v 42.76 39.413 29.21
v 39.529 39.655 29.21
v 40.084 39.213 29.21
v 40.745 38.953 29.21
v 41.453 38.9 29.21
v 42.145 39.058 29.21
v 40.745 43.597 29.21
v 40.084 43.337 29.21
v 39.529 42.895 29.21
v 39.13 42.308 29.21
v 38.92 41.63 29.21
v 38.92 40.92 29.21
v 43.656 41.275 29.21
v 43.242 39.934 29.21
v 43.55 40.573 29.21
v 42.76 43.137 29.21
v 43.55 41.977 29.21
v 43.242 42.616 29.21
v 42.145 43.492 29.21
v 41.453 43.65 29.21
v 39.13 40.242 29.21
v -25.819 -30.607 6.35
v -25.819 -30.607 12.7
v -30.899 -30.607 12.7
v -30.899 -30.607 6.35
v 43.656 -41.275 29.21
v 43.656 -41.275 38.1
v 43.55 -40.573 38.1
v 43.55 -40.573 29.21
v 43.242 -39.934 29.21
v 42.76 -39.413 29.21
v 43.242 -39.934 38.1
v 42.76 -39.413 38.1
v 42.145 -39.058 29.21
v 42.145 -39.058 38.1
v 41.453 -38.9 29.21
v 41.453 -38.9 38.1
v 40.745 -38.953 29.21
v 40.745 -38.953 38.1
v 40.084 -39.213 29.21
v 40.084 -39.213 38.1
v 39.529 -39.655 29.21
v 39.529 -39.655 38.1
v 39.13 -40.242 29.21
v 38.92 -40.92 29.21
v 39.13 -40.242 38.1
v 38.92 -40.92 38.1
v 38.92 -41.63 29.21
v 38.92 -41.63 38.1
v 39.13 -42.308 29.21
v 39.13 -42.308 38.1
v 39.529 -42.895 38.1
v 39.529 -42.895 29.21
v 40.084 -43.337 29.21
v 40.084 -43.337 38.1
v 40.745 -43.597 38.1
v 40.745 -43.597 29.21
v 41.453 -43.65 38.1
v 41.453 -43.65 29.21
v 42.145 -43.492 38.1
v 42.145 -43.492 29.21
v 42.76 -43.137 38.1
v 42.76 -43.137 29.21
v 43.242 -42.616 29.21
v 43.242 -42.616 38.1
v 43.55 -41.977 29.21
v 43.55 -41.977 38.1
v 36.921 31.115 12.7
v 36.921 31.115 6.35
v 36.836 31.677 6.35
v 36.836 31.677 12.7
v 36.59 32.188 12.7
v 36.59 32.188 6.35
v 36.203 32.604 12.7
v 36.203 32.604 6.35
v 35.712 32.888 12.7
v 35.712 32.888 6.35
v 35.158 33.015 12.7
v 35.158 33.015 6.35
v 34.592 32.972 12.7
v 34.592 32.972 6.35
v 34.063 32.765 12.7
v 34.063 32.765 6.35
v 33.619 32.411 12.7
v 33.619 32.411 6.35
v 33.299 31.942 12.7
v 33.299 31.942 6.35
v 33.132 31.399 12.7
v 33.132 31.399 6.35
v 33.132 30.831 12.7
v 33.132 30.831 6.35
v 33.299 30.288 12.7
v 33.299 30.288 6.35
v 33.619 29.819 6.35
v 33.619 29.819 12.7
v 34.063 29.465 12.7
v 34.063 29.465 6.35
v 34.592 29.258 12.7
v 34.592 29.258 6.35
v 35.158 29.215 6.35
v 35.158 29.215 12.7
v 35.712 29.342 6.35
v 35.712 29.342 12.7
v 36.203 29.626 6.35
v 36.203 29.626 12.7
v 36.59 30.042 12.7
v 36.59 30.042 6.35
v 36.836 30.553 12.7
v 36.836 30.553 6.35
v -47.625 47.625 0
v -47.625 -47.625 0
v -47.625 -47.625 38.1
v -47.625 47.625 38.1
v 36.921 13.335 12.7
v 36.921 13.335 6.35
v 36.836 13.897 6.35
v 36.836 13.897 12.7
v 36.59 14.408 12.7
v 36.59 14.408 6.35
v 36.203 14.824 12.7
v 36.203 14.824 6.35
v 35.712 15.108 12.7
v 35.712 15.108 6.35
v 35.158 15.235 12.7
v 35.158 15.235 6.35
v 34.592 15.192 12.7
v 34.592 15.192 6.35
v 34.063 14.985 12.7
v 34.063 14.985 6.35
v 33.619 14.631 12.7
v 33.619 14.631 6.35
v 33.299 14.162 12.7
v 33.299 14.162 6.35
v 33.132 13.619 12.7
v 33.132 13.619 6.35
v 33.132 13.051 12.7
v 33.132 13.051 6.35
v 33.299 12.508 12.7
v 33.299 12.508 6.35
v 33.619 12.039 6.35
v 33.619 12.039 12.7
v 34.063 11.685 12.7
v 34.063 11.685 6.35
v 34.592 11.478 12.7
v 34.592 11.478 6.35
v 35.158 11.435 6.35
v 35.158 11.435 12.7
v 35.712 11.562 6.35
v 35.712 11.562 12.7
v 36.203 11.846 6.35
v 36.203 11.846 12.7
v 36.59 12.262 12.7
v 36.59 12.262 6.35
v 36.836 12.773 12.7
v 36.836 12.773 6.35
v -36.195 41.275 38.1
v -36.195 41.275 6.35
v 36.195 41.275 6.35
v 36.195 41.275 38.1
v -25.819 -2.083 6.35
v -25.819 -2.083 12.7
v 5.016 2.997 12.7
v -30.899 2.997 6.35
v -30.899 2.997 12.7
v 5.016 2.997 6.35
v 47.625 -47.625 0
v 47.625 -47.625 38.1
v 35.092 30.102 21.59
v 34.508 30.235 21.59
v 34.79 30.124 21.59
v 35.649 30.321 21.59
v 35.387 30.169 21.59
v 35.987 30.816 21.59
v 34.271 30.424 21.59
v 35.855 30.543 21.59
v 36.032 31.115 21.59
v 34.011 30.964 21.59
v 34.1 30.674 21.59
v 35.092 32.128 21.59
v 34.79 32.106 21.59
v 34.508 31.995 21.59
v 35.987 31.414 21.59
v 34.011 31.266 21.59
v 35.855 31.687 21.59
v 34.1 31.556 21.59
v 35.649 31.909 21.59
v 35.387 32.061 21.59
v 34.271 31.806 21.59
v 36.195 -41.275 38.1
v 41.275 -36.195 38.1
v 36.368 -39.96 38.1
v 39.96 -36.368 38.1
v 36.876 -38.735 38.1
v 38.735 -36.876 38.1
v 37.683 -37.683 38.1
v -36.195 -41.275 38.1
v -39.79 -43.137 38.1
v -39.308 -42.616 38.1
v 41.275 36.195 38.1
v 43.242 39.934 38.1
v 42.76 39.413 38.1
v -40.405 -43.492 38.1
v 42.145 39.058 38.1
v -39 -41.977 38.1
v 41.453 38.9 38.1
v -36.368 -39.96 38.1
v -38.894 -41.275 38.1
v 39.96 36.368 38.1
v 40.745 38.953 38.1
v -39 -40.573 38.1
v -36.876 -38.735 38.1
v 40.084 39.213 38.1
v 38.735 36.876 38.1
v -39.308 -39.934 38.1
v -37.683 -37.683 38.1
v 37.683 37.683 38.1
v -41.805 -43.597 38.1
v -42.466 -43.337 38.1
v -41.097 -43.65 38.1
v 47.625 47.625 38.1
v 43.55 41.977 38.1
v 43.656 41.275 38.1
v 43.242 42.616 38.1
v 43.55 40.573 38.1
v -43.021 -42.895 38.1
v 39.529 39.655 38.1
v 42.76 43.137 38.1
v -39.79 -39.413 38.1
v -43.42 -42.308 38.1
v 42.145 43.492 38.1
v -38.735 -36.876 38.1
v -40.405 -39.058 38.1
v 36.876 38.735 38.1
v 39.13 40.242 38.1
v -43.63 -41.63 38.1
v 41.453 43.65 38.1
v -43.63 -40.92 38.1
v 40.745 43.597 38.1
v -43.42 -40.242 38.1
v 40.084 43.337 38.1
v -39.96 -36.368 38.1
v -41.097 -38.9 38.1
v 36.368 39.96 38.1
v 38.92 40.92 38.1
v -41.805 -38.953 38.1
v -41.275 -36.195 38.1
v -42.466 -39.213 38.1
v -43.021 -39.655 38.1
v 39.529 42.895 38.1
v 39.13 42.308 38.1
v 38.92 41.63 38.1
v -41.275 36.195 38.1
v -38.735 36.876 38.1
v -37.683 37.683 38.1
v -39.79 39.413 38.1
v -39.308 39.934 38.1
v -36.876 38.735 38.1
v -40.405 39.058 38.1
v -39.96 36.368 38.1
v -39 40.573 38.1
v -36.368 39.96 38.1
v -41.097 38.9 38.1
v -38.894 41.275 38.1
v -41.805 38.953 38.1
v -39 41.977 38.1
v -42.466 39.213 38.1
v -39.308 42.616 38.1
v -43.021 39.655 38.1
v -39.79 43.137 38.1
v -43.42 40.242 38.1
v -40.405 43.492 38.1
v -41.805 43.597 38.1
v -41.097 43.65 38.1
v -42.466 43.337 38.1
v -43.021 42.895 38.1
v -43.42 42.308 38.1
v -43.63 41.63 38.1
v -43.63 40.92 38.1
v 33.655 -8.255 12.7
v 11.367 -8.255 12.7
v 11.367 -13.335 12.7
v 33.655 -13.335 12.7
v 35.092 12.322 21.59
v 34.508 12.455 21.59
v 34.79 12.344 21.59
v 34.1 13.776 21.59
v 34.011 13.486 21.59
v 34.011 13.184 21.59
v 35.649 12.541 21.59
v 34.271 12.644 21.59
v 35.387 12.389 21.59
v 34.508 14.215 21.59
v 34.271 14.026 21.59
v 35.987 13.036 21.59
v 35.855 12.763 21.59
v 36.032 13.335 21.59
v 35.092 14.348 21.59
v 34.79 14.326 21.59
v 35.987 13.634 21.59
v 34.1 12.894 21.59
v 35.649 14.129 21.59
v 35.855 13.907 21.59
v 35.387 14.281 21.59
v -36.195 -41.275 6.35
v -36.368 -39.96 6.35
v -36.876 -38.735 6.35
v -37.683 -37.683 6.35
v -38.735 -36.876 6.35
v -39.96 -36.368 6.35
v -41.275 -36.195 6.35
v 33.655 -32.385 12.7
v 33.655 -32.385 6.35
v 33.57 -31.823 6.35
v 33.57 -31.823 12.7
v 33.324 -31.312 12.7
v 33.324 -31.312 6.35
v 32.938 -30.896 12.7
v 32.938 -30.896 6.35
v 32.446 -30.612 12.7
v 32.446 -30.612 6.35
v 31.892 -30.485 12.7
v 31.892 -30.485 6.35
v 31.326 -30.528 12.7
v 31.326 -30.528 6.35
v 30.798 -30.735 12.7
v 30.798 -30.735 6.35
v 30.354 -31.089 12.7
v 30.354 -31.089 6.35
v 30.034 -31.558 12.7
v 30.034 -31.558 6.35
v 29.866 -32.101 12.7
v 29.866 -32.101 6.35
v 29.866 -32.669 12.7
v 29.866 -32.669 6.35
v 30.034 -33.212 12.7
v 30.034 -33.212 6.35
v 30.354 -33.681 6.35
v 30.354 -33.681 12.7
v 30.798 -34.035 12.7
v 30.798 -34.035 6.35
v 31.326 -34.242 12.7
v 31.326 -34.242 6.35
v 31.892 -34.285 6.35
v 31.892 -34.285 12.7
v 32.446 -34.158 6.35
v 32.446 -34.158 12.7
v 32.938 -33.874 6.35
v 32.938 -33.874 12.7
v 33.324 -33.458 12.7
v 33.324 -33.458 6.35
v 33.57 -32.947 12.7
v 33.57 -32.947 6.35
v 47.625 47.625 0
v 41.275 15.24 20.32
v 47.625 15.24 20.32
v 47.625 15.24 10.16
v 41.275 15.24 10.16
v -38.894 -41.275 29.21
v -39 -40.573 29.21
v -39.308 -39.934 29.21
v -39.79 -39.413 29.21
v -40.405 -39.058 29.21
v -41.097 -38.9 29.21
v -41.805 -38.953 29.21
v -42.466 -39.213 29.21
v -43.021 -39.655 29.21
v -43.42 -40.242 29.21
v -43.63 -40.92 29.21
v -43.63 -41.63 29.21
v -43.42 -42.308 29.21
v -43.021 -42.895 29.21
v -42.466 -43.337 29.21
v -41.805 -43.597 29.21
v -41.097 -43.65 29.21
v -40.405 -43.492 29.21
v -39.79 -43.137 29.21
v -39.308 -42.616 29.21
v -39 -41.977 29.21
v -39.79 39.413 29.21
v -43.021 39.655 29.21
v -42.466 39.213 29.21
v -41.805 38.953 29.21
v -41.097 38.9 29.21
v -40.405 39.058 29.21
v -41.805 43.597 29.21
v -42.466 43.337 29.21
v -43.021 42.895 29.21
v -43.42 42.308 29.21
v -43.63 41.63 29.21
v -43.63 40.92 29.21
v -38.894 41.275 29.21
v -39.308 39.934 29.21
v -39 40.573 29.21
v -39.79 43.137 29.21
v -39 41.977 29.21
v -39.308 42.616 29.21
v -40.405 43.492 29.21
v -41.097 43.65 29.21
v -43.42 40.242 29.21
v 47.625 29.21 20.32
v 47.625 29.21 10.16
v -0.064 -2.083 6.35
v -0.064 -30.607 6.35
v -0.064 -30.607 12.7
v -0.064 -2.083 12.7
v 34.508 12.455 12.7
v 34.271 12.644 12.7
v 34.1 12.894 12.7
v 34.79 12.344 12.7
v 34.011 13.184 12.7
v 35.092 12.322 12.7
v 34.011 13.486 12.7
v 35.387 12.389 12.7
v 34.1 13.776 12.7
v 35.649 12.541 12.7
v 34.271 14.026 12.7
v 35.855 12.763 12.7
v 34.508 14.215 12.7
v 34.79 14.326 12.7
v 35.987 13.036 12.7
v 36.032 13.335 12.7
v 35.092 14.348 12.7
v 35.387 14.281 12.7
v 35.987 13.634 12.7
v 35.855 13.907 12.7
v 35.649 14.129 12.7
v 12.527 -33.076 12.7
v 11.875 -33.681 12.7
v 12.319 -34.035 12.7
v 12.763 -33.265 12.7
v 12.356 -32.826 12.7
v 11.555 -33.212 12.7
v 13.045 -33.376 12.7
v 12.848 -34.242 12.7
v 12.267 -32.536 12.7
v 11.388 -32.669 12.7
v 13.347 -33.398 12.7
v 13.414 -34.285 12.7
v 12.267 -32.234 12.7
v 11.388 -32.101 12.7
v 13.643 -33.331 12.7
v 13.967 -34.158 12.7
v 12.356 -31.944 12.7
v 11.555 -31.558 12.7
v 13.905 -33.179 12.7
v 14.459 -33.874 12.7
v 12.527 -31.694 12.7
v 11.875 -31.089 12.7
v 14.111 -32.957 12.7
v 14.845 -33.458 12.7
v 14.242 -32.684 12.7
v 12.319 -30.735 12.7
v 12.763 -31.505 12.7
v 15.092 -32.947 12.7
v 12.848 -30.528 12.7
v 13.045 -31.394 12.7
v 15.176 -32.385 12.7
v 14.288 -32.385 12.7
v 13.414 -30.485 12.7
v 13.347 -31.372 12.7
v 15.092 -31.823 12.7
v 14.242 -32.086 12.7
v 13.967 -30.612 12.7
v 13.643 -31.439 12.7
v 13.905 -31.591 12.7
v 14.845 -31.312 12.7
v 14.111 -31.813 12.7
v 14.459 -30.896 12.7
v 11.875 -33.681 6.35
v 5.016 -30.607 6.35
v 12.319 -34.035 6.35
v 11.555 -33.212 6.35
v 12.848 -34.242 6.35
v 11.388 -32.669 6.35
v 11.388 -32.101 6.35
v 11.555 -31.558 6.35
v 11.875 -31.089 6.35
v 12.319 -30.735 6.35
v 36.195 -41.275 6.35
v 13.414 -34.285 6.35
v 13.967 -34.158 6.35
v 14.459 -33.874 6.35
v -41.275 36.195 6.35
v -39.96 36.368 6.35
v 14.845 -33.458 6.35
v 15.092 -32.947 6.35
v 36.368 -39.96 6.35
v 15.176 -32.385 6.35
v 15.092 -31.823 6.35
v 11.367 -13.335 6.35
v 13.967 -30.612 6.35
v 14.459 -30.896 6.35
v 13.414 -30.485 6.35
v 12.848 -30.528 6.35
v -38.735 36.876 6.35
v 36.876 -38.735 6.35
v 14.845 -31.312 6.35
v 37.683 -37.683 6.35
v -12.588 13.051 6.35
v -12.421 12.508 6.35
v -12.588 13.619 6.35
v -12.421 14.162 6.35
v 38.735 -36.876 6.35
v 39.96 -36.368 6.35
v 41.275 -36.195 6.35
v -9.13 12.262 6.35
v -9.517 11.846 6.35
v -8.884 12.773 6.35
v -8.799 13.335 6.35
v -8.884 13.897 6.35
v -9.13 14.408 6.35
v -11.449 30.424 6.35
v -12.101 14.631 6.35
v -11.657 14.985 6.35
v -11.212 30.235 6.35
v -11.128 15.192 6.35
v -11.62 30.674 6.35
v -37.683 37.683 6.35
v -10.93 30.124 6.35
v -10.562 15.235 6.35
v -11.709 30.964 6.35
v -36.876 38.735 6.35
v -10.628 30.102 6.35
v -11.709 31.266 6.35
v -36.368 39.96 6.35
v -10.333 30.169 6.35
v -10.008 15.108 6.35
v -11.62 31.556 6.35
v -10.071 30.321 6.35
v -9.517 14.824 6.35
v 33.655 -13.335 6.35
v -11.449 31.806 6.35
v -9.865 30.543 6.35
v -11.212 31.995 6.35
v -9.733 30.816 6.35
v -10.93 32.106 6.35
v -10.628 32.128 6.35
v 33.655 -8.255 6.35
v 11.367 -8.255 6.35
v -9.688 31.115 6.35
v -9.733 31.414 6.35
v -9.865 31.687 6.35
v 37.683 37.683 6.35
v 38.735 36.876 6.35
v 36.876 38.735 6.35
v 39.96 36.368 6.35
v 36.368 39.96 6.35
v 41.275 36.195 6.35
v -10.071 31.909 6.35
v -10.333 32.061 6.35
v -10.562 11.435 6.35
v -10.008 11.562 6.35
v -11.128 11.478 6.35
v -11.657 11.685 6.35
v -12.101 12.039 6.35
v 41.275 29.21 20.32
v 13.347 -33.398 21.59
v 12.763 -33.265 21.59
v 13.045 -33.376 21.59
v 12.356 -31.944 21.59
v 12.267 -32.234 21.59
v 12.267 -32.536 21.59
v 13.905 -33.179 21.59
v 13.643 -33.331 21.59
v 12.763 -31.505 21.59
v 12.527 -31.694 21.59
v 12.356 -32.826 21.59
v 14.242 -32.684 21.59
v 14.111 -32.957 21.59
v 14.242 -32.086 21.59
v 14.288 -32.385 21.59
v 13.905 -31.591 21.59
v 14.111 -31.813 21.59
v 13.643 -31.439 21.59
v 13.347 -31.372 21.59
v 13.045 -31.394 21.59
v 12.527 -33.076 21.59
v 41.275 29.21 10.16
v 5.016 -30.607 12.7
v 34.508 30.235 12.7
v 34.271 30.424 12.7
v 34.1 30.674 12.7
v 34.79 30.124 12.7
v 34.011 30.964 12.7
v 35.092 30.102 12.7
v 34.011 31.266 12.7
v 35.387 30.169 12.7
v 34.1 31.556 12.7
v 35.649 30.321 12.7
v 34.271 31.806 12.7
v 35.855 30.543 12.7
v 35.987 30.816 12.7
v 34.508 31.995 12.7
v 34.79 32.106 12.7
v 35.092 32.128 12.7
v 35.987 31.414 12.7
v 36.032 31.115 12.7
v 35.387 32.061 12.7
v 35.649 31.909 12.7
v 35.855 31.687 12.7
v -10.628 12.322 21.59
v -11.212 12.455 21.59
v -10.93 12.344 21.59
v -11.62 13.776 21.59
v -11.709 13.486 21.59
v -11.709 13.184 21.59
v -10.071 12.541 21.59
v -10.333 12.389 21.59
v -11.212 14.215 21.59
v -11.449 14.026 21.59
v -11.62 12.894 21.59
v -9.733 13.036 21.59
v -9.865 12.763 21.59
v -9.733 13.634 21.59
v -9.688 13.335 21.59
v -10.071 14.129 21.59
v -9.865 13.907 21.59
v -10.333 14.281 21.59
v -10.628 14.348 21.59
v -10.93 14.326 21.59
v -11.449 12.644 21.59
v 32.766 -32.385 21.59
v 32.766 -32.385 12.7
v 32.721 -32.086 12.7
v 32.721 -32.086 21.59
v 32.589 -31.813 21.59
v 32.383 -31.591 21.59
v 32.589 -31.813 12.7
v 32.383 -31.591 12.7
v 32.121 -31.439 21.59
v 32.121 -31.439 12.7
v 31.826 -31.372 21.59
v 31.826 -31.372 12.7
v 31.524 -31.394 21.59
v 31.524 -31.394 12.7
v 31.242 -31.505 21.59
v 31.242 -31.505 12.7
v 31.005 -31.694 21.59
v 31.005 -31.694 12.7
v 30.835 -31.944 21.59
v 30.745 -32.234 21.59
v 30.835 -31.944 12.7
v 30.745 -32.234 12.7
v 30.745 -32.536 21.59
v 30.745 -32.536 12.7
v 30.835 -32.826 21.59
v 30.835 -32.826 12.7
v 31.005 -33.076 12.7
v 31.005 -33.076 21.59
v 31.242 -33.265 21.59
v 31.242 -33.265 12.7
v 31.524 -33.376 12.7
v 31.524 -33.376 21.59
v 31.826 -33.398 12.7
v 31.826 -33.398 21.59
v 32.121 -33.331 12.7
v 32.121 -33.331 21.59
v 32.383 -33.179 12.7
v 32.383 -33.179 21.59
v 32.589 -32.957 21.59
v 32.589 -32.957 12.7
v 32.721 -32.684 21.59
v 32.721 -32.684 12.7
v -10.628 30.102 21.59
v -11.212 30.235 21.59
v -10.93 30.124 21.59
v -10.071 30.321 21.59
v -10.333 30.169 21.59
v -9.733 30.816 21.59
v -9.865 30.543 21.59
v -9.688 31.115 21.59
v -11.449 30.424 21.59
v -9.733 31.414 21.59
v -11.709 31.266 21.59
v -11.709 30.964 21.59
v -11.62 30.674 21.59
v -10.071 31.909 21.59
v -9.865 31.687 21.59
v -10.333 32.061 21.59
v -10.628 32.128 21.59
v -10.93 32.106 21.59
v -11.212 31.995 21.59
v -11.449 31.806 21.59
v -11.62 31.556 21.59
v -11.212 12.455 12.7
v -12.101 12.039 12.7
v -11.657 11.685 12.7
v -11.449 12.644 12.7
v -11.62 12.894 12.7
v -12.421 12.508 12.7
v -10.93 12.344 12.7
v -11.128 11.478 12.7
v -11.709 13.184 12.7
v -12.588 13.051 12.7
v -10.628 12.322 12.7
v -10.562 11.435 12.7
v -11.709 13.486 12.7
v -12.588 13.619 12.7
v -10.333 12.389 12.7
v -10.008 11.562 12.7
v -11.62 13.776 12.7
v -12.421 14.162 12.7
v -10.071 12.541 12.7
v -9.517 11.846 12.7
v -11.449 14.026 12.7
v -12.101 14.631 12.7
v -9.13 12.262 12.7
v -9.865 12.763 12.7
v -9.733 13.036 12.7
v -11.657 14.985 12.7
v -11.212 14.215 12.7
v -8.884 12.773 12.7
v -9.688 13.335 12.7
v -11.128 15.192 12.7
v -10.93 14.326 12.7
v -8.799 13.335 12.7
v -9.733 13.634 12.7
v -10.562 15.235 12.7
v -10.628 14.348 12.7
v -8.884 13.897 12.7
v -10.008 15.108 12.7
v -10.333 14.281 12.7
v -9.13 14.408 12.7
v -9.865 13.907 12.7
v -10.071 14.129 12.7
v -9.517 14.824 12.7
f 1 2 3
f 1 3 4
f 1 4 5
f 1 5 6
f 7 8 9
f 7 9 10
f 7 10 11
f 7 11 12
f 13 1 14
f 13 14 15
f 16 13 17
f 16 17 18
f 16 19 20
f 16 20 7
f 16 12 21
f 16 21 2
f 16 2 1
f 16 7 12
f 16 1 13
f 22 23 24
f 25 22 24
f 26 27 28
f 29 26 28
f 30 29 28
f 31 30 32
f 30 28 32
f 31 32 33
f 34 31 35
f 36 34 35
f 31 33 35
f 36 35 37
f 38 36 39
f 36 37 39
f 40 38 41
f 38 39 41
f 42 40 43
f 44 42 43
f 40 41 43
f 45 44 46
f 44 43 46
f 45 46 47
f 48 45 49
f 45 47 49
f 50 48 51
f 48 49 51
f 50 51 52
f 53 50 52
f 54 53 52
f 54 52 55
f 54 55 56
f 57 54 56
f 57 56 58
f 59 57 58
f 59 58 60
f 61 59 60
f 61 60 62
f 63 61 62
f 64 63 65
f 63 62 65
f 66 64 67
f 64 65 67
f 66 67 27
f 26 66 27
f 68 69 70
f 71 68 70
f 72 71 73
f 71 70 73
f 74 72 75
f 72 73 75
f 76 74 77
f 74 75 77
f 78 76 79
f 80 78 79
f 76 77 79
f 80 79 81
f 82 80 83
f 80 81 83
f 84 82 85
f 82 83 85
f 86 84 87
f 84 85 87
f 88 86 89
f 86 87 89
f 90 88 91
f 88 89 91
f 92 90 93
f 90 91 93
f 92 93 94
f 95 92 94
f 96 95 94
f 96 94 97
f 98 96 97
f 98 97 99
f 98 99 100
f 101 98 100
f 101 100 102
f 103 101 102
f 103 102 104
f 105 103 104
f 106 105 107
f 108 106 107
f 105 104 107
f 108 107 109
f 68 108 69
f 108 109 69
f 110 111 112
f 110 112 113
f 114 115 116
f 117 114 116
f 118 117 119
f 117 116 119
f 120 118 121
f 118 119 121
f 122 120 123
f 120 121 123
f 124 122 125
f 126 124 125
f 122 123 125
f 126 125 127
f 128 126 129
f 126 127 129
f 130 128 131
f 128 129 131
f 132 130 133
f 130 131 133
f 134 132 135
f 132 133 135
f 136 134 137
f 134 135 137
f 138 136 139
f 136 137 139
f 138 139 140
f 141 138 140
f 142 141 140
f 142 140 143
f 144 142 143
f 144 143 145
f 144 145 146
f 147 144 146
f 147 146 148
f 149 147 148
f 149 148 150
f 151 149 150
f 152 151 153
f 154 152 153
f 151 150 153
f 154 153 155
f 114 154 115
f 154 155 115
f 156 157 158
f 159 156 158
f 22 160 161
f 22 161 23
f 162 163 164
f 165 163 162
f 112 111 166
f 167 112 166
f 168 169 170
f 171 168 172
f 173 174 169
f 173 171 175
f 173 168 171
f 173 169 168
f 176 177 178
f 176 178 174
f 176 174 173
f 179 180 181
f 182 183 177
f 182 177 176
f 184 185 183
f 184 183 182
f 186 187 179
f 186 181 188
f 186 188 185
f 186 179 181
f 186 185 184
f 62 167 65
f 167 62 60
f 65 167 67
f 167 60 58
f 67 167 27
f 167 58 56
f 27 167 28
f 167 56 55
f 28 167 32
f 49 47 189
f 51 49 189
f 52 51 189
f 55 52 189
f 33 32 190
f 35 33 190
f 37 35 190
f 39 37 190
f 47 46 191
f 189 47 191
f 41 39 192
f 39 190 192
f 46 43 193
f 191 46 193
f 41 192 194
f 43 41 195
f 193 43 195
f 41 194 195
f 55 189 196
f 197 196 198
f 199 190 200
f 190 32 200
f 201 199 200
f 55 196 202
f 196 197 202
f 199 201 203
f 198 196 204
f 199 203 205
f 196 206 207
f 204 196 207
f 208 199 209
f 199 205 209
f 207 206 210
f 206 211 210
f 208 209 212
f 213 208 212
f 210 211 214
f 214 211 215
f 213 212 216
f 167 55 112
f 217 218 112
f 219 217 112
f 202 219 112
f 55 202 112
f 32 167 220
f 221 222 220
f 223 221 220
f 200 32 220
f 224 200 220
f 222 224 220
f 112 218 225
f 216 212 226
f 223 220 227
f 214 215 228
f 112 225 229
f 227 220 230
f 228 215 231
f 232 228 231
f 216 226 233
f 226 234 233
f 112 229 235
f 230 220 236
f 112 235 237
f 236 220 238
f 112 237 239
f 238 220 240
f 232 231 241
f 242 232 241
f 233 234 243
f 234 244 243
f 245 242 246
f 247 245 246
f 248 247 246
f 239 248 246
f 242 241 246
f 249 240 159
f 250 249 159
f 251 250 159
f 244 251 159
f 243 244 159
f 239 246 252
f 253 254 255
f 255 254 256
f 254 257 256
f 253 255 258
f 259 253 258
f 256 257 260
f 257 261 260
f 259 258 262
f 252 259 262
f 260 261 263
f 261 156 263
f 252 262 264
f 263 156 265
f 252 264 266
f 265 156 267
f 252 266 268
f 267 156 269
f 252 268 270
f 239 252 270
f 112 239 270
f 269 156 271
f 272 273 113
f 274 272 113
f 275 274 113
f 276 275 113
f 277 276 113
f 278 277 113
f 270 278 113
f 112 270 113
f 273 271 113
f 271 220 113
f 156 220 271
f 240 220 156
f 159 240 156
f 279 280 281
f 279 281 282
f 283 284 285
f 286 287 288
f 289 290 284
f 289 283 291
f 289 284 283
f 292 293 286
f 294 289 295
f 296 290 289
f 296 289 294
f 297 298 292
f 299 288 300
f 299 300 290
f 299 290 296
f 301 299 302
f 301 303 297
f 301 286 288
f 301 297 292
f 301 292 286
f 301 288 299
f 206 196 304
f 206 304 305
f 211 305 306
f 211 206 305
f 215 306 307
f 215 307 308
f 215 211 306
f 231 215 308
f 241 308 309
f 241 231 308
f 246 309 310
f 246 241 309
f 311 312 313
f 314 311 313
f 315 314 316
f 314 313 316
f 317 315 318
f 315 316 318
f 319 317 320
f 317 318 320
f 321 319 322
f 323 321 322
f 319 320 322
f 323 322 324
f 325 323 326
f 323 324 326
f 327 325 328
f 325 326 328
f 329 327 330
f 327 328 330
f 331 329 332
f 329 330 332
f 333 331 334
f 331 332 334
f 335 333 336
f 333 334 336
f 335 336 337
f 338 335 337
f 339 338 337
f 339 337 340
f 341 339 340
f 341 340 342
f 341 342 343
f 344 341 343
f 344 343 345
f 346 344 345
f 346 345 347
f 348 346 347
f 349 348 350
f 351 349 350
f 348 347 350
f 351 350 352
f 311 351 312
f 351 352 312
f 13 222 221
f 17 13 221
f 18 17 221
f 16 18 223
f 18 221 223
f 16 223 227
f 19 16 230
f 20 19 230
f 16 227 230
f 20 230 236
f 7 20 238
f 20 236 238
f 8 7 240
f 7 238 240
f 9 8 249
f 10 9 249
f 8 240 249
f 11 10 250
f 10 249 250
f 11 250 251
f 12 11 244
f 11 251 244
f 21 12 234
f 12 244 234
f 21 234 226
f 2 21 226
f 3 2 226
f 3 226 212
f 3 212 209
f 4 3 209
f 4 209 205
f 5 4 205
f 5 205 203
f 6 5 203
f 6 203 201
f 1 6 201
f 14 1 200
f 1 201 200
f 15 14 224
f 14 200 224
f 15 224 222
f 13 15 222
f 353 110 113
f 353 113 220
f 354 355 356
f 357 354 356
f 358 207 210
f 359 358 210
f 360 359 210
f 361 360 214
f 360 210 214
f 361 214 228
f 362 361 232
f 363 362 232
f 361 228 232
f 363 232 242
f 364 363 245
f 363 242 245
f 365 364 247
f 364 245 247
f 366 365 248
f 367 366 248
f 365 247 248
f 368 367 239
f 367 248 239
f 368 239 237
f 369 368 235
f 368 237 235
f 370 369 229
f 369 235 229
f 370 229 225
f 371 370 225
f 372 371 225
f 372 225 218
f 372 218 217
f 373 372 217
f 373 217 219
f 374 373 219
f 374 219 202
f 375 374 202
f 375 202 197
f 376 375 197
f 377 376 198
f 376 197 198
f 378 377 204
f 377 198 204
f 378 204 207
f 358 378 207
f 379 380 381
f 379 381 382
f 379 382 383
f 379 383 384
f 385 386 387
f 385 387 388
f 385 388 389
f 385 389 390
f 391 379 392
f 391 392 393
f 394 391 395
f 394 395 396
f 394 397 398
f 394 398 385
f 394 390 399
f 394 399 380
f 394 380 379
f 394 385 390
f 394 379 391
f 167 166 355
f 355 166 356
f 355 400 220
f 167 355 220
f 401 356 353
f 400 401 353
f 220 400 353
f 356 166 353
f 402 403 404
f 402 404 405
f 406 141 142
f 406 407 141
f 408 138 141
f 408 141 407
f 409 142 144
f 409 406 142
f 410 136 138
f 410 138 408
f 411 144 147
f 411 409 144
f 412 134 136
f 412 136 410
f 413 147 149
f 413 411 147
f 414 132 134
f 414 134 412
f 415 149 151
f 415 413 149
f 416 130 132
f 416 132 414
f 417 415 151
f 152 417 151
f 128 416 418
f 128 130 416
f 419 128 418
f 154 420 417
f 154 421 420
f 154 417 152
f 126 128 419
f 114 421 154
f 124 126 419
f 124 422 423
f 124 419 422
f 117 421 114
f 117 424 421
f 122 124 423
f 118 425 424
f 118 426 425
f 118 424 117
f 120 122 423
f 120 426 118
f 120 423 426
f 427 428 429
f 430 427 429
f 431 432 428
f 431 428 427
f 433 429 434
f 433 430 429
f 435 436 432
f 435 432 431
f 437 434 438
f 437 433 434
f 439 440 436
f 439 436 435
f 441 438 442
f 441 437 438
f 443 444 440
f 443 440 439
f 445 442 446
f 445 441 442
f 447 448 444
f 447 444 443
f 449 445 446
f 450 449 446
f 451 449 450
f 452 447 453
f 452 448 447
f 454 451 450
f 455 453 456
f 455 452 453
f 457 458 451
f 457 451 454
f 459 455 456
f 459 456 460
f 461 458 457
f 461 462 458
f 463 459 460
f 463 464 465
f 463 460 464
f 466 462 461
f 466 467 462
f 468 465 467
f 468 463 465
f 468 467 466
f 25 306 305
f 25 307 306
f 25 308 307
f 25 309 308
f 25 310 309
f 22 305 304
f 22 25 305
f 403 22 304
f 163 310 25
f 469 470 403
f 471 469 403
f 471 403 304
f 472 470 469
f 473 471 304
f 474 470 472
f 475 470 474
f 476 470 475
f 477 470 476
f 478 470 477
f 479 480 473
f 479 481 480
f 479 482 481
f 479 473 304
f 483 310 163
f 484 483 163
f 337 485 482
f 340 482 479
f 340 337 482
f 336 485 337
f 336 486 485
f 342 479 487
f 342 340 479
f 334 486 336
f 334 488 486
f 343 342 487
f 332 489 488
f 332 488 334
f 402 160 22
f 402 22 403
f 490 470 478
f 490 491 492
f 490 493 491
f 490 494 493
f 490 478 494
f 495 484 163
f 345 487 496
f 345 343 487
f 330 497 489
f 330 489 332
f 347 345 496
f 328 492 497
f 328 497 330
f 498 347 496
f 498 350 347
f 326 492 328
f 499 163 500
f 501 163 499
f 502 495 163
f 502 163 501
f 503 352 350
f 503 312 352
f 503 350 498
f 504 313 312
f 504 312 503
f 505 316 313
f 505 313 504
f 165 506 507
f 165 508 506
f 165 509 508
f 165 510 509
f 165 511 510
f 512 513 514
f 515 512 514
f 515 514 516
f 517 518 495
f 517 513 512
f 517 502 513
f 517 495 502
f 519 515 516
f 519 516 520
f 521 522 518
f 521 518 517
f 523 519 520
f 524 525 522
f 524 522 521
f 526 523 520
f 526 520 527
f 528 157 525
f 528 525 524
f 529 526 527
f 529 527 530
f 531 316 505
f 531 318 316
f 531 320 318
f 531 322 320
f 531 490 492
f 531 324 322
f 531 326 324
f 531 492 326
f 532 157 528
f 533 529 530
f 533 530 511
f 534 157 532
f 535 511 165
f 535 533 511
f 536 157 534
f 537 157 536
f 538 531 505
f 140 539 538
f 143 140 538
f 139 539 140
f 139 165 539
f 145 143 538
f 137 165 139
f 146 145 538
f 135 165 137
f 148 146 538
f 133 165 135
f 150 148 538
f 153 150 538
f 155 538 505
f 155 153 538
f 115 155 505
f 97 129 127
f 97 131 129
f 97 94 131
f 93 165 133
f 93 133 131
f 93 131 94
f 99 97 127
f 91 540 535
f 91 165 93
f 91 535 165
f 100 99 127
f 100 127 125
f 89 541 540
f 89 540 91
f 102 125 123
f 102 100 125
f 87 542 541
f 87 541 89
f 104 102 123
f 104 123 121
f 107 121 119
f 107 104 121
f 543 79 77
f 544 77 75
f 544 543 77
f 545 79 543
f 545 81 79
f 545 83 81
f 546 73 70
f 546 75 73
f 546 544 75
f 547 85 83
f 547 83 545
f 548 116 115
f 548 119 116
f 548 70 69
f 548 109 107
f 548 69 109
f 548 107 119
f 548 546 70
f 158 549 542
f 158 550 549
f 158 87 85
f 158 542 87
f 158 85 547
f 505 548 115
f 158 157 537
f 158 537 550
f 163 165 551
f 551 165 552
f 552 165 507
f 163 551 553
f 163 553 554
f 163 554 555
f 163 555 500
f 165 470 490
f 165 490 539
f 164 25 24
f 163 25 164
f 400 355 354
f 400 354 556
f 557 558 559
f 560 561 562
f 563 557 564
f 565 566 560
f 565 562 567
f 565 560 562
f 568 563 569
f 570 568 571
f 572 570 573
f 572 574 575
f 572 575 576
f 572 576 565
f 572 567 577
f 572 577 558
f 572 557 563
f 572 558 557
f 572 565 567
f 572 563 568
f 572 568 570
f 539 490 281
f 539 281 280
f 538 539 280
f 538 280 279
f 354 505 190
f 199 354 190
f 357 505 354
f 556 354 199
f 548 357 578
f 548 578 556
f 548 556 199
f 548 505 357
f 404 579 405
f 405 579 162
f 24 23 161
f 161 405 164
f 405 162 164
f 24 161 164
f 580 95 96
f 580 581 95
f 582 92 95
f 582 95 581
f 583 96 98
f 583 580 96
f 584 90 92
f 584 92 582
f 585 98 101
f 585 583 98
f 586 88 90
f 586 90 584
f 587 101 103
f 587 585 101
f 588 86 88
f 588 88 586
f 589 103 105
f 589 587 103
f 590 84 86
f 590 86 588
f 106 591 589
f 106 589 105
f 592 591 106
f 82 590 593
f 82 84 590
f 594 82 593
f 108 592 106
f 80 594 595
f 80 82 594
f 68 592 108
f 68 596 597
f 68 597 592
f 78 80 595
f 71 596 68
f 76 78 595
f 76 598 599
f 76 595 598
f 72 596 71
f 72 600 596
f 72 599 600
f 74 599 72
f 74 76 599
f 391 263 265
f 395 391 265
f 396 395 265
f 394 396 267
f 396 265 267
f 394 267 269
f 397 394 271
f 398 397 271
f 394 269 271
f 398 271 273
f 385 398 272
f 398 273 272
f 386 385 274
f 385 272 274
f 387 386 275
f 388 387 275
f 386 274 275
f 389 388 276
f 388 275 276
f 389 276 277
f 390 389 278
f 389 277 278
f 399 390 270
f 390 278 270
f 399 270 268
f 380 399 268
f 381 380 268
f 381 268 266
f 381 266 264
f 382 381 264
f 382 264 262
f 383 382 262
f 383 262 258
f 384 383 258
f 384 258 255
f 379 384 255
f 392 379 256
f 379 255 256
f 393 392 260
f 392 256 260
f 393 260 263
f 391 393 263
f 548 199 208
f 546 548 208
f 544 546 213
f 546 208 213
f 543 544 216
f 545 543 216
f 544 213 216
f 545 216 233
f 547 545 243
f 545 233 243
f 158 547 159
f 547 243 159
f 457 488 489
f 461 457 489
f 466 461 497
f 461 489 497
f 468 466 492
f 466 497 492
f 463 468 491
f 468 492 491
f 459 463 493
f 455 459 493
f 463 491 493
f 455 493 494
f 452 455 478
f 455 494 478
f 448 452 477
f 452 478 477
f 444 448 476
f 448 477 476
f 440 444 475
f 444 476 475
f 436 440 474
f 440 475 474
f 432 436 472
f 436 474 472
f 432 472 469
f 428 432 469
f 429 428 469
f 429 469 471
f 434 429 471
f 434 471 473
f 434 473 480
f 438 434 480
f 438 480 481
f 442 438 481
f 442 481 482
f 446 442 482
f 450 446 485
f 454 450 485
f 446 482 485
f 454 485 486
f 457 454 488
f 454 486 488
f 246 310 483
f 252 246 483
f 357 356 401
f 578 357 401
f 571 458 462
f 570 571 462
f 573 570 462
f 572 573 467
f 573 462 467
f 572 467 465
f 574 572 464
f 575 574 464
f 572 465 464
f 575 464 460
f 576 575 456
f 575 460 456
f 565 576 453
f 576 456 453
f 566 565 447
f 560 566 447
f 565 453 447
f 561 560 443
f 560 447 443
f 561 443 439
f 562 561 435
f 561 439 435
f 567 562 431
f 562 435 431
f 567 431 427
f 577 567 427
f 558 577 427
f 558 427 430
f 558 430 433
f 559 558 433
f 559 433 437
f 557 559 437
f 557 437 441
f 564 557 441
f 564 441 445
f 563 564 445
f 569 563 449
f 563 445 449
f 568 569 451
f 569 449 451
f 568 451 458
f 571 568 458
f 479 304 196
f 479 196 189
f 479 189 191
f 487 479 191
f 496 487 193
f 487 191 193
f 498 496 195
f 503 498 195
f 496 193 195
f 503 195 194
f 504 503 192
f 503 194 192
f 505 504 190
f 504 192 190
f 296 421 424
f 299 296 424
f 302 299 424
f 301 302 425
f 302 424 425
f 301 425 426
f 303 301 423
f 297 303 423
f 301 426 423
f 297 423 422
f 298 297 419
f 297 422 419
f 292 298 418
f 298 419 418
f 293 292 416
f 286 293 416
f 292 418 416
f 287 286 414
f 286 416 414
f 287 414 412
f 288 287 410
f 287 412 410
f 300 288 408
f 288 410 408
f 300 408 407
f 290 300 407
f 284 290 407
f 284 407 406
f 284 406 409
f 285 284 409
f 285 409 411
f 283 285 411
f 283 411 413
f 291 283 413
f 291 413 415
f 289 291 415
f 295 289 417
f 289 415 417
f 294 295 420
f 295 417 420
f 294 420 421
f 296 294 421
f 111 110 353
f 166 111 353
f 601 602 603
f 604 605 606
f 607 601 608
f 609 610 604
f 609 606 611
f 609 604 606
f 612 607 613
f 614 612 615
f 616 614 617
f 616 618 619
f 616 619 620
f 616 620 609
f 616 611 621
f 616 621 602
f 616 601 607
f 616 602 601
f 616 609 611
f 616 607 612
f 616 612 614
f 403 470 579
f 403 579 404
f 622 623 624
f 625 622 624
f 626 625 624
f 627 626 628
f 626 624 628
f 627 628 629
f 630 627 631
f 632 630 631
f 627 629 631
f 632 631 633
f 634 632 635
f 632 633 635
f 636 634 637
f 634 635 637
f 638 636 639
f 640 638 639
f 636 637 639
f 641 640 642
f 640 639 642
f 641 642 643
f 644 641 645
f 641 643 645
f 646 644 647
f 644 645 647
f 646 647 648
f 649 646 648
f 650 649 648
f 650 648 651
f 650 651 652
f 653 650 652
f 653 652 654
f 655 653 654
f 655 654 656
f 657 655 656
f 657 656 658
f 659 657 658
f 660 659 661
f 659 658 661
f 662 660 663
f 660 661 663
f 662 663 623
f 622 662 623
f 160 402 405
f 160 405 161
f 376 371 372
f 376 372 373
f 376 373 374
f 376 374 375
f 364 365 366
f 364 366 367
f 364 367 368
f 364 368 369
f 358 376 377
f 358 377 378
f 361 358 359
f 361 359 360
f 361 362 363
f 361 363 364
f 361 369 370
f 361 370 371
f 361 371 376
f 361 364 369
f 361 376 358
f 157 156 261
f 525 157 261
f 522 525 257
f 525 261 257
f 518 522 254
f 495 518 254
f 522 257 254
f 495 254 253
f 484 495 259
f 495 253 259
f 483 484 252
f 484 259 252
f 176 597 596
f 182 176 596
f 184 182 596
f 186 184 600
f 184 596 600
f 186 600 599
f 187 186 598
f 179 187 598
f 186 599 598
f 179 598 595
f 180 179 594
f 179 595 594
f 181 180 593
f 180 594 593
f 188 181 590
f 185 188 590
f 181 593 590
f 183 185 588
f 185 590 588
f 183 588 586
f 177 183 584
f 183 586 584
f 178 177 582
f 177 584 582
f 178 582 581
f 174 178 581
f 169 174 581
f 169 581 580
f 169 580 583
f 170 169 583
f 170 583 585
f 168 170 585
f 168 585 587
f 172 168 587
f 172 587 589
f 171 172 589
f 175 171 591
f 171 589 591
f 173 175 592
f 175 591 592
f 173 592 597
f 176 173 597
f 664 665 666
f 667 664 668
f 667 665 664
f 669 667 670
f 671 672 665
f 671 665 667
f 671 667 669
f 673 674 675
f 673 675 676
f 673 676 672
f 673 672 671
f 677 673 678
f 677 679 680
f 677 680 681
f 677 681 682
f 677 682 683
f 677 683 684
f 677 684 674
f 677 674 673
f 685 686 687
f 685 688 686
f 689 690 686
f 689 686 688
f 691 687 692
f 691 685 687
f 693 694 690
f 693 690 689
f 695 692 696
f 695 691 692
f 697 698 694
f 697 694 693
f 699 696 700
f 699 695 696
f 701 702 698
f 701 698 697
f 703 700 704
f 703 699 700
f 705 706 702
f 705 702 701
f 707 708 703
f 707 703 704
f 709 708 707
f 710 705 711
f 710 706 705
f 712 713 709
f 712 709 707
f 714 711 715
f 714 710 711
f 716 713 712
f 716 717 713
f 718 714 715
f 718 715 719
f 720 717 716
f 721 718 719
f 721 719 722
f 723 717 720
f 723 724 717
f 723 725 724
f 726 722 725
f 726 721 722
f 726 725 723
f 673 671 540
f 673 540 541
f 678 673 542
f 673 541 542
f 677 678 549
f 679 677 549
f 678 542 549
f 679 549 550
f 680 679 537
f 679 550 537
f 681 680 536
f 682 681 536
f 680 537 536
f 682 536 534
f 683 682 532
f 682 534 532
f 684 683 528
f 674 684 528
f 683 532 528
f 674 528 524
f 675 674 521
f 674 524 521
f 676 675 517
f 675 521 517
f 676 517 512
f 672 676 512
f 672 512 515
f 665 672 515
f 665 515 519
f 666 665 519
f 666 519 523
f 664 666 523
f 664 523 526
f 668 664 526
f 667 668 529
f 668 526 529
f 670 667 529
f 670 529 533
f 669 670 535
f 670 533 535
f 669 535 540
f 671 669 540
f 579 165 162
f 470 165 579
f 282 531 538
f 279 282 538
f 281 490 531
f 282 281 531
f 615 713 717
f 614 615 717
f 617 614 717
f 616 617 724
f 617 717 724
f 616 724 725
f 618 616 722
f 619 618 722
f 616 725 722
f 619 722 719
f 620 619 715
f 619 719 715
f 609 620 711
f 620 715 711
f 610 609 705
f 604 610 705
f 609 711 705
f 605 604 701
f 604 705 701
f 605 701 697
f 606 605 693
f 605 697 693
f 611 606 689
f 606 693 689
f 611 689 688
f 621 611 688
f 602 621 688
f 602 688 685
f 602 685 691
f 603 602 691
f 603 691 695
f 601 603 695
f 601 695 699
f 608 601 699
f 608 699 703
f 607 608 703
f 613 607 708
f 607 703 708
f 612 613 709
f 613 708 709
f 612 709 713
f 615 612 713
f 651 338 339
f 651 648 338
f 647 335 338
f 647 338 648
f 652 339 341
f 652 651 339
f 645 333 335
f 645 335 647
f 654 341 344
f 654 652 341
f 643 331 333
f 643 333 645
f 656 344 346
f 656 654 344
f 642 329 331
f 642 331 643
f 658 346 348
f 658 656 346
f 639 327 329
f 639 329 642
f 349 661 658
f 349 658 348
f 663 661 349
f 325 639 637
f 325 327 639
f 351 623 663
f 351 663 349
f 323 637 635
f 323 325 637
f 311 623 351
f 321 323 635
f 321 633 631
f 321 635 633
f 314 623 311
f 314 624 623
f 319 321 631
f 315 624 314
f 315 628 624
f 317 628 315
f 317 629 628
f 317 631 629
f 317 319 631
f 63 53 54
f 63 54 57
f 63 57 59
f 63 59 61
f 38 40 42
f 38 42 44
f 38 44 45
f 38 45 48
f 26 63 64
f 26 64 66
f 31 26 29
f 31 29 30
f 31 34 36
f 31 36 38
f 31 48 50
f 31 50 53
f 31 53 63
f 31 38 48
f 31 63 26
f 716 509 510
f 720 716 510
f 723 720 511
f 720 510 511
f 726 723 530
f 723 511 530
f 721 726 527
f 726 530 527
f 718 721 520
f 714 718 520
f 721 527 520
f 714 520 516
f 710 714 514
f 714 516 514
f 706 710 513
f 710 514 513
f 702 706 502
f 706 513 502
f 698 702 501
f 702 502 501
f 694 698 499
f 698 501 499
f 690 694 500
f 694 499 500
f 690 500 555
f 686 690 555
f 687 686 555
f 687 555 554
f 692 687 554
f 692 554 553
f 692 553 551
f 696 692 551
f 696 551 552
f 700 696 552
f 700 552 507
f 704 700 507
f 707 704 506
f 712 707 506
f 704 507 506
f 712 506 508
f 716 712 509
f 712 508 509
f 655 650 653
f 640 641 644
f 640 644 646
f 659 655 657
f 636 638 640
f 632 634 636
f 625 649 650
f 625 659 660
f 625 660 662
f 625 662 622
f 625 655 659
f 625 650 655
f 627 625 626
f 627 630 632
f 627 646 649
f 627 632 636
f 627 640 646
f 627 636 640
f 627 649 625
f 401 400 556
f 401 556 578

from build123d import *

# Parameters (mm, degrees)
SKETCH1_W           = 95.25
SKETCH1_H           = 95.25
BOSS_EXTRUDE1_DEPTH = 38.1
SHELL1_T            = -6.35
BOSS_EXTRUDE2_DEPTH = 31.75
SKETCH3_R           = 1.905
SKETCH3_R_2         = 1.016
BOSS_EXTRUDE3_DEPTH = 6.35
SKETCH4_R           = 1.016
BOSS_EXTRUDE4_DEPTH = 8.89
SKETCH5_R           = 1.905
SKETCH5_W           = 22.2885
SKETCH5_H           = 5.08
BOSS_EXTRUDE5_DEPTH = 6.35
SKETCH7_R           = 1.016
BOSS_EXTRUDE6_DEPTH = 8.89
SKETCH8_R           = 2.38125
CUT_EXTRUDE1_DEPTH  = 8.89
BOSS_EXTRUDE7_DEPTH = 6.35
SKETCH12_W          = 10.16
SKETCH12_H          = 13.97
CUT_EXTRUDE2_DEPTH  = 6.35


with BuildPart() as part:
    # Sketch1 → Boss-Extrude1 (new body)
    with BuildSketch(Plane.XY):
        Rectangle(SKETCH1_W, SKETCH1_H)
    extrude(amount=BOSS_EXTRUDE1_DEPTH)

    # Shell1
    shell1_openings = [part.faces().sort_by_distance(p)[0] for p in [
        (0, 0, 38.1),
    ]]
    offset(amount=SHELL1_T, openings=shell1_openings, kind=Kind.INTERSECTION)

    # Sketch2 → Boss-Extrude2 (add)
    with BuildSketch(Plane.XY.offset(38.1)):
        with BuildLine():
            Line((-41.275, 41.275), (-36.195, 41.275))
            ThreePointArc((-36.195, 41.275), (-37.682897552, 37.682897552), (-41.275, 36.195))
            Line((-41.275, 36.195), (-41.275, 41.275))
        make_face()
        with BuildLine():
            Line((36.195, 41.275), (41.275, 41.275))
            Line((41.275, 41.275), (41.275, 36.195))
            ThreePointArc((41.275, 36.195), (37.682897552, 37.682897552), (36.195, 41.275))
        make_face()
        with BuildLine():
            Line((41.275, -36.195), (41.275, -41.275))
            Line((41.275, -41.275), (36.195, -41.275))
            ThreePointArc((36.195, -41.275), (37.682897552, -37.682897552), (41.275, -36.195))
        make_face()
        with BuildLine():
            Line((-41.275, -36.195), (-41.275, -41.275))
            Line((-41.275, -41.275), (-36.195, -41.275))
            ThreePointArc((-36.195, -41.275), (-37.682897552, -37.682897552), (-41.275, -36.195))
        make_face()
    extrude(amount=-BOSS_EXTRUDE2_DEPTH)

    # Sketch3 → Boss-Extrude3 (add)
    with BuildSketch(Plane.XY.offset(6.35)):
        with Locations((35.015710728, 31.115)):
            Circle(SKETCH3_R)
        with Locations((-10.704289272, 31.115)):
            Circle(SKETCH3_R_2)
        with Locations((-10.704289272, 13.335)):
            Circle(SKETCH3_R)
        with Locations((35.015710728, 13.335)):
            Circle(SKETCH3_R)
    extrude(amount=BOSS_EXTRUDE3_DEPTH)

    # Sketch4 → Boss-Extrude4 (add)
    with BuildSketch(Plane.XY.offset(12.7)):
        with Locations((-10.704289272, 31.115)):
            Circle(SKETCH4_R)
        with Locations((-10.704289272, 13.335)):
            Circle(SKETCH4_R)
        with Locations((35.015710728, 31.115)):
            Circle(SKETCH4_R)
        with Locations((35.015710728, 13.335)):
            Circle(SKETCH4_R)
    extrude(amount=BOSS_EXTRUDE4_DEPTH)

    # Sketch5 → Boss-Extrude5 (add)
    with BuildSketch(Plane.XY.offset(6.35)):
        with Locations((13.2715, -32.385)):
            Circle(SKETCH5_R)
        with Locations((31.75, -32.385)):
            Circle(SKETCH5_R)
        with Locations((22.51075, -10.795)):
            Rectangle(SKETCH5_W, SKETCH5_H)
    extrude(amount=BOSS_EXTRUDE5_DEPTH)

    # Sketch7 → Boss-Extrude6 (add)
    with BuildSketch(Plane.XY.offset(12.7)):
        with Locations((13.2715, -32.385)):
            Circle(SKETCH7_R)
        with Locations((31.75, -32.385)):
            Circle(SKETCH7_R)
    extrude(amount=BOSS_EXTRUDE6_DEPTH)

    # Sketch8 → Cut-Extrude1 (cut)
    with BuildSketch(Plane.XY.offset(38.1)):
        with Locations((-41.275, 41.275)):
            Circle(SKETCH8_R)
        with Locations((41.275, 41.275)):
            Circle(SKETCH8_R)
        with Locations((41.275, -41.275)):
            Circle(SKETCH8_R)
        with Locations((-41.275, -41.275)):
            Circle(SKETCH8_R)
    extrude(amount=-CUT_EXTRUDE1_DEPTH, mode=Mode.SUBTRACT)

    # Sketch10 → Boss-Extrude7 (add)
    with BuildSketch(Plane.XY.offset(6.35)):
        Polygon((-30.8991, -30.607), (-30.8991, 2.9972), (5.0165, 2.9972), (5.0165, -30.607), (-0.0635, -30.607), (-0.0635, -2.0828), (-25.8191, -2.0828), (-25.8191, -30.607), align=None)
    extrude(amount=BOSS_EXTRUDE7_DEPTH)

    # Sketch12 → Cut-Extrude2 (cut)
    with BuildSketch(Plane(origin=(47.625, 0, 0), x_dir=(0, 0, -1), z_dir=(1, 0, 0))):
        with Locations((-15.24, 22.225)):
            Rectangle(SKETCH12_W, SKETCH12_H)
    extrude(amount=-CUT_EXTRUDE2_DEPTH, mode=Mode.SUBTRACT)


solid = part.part
